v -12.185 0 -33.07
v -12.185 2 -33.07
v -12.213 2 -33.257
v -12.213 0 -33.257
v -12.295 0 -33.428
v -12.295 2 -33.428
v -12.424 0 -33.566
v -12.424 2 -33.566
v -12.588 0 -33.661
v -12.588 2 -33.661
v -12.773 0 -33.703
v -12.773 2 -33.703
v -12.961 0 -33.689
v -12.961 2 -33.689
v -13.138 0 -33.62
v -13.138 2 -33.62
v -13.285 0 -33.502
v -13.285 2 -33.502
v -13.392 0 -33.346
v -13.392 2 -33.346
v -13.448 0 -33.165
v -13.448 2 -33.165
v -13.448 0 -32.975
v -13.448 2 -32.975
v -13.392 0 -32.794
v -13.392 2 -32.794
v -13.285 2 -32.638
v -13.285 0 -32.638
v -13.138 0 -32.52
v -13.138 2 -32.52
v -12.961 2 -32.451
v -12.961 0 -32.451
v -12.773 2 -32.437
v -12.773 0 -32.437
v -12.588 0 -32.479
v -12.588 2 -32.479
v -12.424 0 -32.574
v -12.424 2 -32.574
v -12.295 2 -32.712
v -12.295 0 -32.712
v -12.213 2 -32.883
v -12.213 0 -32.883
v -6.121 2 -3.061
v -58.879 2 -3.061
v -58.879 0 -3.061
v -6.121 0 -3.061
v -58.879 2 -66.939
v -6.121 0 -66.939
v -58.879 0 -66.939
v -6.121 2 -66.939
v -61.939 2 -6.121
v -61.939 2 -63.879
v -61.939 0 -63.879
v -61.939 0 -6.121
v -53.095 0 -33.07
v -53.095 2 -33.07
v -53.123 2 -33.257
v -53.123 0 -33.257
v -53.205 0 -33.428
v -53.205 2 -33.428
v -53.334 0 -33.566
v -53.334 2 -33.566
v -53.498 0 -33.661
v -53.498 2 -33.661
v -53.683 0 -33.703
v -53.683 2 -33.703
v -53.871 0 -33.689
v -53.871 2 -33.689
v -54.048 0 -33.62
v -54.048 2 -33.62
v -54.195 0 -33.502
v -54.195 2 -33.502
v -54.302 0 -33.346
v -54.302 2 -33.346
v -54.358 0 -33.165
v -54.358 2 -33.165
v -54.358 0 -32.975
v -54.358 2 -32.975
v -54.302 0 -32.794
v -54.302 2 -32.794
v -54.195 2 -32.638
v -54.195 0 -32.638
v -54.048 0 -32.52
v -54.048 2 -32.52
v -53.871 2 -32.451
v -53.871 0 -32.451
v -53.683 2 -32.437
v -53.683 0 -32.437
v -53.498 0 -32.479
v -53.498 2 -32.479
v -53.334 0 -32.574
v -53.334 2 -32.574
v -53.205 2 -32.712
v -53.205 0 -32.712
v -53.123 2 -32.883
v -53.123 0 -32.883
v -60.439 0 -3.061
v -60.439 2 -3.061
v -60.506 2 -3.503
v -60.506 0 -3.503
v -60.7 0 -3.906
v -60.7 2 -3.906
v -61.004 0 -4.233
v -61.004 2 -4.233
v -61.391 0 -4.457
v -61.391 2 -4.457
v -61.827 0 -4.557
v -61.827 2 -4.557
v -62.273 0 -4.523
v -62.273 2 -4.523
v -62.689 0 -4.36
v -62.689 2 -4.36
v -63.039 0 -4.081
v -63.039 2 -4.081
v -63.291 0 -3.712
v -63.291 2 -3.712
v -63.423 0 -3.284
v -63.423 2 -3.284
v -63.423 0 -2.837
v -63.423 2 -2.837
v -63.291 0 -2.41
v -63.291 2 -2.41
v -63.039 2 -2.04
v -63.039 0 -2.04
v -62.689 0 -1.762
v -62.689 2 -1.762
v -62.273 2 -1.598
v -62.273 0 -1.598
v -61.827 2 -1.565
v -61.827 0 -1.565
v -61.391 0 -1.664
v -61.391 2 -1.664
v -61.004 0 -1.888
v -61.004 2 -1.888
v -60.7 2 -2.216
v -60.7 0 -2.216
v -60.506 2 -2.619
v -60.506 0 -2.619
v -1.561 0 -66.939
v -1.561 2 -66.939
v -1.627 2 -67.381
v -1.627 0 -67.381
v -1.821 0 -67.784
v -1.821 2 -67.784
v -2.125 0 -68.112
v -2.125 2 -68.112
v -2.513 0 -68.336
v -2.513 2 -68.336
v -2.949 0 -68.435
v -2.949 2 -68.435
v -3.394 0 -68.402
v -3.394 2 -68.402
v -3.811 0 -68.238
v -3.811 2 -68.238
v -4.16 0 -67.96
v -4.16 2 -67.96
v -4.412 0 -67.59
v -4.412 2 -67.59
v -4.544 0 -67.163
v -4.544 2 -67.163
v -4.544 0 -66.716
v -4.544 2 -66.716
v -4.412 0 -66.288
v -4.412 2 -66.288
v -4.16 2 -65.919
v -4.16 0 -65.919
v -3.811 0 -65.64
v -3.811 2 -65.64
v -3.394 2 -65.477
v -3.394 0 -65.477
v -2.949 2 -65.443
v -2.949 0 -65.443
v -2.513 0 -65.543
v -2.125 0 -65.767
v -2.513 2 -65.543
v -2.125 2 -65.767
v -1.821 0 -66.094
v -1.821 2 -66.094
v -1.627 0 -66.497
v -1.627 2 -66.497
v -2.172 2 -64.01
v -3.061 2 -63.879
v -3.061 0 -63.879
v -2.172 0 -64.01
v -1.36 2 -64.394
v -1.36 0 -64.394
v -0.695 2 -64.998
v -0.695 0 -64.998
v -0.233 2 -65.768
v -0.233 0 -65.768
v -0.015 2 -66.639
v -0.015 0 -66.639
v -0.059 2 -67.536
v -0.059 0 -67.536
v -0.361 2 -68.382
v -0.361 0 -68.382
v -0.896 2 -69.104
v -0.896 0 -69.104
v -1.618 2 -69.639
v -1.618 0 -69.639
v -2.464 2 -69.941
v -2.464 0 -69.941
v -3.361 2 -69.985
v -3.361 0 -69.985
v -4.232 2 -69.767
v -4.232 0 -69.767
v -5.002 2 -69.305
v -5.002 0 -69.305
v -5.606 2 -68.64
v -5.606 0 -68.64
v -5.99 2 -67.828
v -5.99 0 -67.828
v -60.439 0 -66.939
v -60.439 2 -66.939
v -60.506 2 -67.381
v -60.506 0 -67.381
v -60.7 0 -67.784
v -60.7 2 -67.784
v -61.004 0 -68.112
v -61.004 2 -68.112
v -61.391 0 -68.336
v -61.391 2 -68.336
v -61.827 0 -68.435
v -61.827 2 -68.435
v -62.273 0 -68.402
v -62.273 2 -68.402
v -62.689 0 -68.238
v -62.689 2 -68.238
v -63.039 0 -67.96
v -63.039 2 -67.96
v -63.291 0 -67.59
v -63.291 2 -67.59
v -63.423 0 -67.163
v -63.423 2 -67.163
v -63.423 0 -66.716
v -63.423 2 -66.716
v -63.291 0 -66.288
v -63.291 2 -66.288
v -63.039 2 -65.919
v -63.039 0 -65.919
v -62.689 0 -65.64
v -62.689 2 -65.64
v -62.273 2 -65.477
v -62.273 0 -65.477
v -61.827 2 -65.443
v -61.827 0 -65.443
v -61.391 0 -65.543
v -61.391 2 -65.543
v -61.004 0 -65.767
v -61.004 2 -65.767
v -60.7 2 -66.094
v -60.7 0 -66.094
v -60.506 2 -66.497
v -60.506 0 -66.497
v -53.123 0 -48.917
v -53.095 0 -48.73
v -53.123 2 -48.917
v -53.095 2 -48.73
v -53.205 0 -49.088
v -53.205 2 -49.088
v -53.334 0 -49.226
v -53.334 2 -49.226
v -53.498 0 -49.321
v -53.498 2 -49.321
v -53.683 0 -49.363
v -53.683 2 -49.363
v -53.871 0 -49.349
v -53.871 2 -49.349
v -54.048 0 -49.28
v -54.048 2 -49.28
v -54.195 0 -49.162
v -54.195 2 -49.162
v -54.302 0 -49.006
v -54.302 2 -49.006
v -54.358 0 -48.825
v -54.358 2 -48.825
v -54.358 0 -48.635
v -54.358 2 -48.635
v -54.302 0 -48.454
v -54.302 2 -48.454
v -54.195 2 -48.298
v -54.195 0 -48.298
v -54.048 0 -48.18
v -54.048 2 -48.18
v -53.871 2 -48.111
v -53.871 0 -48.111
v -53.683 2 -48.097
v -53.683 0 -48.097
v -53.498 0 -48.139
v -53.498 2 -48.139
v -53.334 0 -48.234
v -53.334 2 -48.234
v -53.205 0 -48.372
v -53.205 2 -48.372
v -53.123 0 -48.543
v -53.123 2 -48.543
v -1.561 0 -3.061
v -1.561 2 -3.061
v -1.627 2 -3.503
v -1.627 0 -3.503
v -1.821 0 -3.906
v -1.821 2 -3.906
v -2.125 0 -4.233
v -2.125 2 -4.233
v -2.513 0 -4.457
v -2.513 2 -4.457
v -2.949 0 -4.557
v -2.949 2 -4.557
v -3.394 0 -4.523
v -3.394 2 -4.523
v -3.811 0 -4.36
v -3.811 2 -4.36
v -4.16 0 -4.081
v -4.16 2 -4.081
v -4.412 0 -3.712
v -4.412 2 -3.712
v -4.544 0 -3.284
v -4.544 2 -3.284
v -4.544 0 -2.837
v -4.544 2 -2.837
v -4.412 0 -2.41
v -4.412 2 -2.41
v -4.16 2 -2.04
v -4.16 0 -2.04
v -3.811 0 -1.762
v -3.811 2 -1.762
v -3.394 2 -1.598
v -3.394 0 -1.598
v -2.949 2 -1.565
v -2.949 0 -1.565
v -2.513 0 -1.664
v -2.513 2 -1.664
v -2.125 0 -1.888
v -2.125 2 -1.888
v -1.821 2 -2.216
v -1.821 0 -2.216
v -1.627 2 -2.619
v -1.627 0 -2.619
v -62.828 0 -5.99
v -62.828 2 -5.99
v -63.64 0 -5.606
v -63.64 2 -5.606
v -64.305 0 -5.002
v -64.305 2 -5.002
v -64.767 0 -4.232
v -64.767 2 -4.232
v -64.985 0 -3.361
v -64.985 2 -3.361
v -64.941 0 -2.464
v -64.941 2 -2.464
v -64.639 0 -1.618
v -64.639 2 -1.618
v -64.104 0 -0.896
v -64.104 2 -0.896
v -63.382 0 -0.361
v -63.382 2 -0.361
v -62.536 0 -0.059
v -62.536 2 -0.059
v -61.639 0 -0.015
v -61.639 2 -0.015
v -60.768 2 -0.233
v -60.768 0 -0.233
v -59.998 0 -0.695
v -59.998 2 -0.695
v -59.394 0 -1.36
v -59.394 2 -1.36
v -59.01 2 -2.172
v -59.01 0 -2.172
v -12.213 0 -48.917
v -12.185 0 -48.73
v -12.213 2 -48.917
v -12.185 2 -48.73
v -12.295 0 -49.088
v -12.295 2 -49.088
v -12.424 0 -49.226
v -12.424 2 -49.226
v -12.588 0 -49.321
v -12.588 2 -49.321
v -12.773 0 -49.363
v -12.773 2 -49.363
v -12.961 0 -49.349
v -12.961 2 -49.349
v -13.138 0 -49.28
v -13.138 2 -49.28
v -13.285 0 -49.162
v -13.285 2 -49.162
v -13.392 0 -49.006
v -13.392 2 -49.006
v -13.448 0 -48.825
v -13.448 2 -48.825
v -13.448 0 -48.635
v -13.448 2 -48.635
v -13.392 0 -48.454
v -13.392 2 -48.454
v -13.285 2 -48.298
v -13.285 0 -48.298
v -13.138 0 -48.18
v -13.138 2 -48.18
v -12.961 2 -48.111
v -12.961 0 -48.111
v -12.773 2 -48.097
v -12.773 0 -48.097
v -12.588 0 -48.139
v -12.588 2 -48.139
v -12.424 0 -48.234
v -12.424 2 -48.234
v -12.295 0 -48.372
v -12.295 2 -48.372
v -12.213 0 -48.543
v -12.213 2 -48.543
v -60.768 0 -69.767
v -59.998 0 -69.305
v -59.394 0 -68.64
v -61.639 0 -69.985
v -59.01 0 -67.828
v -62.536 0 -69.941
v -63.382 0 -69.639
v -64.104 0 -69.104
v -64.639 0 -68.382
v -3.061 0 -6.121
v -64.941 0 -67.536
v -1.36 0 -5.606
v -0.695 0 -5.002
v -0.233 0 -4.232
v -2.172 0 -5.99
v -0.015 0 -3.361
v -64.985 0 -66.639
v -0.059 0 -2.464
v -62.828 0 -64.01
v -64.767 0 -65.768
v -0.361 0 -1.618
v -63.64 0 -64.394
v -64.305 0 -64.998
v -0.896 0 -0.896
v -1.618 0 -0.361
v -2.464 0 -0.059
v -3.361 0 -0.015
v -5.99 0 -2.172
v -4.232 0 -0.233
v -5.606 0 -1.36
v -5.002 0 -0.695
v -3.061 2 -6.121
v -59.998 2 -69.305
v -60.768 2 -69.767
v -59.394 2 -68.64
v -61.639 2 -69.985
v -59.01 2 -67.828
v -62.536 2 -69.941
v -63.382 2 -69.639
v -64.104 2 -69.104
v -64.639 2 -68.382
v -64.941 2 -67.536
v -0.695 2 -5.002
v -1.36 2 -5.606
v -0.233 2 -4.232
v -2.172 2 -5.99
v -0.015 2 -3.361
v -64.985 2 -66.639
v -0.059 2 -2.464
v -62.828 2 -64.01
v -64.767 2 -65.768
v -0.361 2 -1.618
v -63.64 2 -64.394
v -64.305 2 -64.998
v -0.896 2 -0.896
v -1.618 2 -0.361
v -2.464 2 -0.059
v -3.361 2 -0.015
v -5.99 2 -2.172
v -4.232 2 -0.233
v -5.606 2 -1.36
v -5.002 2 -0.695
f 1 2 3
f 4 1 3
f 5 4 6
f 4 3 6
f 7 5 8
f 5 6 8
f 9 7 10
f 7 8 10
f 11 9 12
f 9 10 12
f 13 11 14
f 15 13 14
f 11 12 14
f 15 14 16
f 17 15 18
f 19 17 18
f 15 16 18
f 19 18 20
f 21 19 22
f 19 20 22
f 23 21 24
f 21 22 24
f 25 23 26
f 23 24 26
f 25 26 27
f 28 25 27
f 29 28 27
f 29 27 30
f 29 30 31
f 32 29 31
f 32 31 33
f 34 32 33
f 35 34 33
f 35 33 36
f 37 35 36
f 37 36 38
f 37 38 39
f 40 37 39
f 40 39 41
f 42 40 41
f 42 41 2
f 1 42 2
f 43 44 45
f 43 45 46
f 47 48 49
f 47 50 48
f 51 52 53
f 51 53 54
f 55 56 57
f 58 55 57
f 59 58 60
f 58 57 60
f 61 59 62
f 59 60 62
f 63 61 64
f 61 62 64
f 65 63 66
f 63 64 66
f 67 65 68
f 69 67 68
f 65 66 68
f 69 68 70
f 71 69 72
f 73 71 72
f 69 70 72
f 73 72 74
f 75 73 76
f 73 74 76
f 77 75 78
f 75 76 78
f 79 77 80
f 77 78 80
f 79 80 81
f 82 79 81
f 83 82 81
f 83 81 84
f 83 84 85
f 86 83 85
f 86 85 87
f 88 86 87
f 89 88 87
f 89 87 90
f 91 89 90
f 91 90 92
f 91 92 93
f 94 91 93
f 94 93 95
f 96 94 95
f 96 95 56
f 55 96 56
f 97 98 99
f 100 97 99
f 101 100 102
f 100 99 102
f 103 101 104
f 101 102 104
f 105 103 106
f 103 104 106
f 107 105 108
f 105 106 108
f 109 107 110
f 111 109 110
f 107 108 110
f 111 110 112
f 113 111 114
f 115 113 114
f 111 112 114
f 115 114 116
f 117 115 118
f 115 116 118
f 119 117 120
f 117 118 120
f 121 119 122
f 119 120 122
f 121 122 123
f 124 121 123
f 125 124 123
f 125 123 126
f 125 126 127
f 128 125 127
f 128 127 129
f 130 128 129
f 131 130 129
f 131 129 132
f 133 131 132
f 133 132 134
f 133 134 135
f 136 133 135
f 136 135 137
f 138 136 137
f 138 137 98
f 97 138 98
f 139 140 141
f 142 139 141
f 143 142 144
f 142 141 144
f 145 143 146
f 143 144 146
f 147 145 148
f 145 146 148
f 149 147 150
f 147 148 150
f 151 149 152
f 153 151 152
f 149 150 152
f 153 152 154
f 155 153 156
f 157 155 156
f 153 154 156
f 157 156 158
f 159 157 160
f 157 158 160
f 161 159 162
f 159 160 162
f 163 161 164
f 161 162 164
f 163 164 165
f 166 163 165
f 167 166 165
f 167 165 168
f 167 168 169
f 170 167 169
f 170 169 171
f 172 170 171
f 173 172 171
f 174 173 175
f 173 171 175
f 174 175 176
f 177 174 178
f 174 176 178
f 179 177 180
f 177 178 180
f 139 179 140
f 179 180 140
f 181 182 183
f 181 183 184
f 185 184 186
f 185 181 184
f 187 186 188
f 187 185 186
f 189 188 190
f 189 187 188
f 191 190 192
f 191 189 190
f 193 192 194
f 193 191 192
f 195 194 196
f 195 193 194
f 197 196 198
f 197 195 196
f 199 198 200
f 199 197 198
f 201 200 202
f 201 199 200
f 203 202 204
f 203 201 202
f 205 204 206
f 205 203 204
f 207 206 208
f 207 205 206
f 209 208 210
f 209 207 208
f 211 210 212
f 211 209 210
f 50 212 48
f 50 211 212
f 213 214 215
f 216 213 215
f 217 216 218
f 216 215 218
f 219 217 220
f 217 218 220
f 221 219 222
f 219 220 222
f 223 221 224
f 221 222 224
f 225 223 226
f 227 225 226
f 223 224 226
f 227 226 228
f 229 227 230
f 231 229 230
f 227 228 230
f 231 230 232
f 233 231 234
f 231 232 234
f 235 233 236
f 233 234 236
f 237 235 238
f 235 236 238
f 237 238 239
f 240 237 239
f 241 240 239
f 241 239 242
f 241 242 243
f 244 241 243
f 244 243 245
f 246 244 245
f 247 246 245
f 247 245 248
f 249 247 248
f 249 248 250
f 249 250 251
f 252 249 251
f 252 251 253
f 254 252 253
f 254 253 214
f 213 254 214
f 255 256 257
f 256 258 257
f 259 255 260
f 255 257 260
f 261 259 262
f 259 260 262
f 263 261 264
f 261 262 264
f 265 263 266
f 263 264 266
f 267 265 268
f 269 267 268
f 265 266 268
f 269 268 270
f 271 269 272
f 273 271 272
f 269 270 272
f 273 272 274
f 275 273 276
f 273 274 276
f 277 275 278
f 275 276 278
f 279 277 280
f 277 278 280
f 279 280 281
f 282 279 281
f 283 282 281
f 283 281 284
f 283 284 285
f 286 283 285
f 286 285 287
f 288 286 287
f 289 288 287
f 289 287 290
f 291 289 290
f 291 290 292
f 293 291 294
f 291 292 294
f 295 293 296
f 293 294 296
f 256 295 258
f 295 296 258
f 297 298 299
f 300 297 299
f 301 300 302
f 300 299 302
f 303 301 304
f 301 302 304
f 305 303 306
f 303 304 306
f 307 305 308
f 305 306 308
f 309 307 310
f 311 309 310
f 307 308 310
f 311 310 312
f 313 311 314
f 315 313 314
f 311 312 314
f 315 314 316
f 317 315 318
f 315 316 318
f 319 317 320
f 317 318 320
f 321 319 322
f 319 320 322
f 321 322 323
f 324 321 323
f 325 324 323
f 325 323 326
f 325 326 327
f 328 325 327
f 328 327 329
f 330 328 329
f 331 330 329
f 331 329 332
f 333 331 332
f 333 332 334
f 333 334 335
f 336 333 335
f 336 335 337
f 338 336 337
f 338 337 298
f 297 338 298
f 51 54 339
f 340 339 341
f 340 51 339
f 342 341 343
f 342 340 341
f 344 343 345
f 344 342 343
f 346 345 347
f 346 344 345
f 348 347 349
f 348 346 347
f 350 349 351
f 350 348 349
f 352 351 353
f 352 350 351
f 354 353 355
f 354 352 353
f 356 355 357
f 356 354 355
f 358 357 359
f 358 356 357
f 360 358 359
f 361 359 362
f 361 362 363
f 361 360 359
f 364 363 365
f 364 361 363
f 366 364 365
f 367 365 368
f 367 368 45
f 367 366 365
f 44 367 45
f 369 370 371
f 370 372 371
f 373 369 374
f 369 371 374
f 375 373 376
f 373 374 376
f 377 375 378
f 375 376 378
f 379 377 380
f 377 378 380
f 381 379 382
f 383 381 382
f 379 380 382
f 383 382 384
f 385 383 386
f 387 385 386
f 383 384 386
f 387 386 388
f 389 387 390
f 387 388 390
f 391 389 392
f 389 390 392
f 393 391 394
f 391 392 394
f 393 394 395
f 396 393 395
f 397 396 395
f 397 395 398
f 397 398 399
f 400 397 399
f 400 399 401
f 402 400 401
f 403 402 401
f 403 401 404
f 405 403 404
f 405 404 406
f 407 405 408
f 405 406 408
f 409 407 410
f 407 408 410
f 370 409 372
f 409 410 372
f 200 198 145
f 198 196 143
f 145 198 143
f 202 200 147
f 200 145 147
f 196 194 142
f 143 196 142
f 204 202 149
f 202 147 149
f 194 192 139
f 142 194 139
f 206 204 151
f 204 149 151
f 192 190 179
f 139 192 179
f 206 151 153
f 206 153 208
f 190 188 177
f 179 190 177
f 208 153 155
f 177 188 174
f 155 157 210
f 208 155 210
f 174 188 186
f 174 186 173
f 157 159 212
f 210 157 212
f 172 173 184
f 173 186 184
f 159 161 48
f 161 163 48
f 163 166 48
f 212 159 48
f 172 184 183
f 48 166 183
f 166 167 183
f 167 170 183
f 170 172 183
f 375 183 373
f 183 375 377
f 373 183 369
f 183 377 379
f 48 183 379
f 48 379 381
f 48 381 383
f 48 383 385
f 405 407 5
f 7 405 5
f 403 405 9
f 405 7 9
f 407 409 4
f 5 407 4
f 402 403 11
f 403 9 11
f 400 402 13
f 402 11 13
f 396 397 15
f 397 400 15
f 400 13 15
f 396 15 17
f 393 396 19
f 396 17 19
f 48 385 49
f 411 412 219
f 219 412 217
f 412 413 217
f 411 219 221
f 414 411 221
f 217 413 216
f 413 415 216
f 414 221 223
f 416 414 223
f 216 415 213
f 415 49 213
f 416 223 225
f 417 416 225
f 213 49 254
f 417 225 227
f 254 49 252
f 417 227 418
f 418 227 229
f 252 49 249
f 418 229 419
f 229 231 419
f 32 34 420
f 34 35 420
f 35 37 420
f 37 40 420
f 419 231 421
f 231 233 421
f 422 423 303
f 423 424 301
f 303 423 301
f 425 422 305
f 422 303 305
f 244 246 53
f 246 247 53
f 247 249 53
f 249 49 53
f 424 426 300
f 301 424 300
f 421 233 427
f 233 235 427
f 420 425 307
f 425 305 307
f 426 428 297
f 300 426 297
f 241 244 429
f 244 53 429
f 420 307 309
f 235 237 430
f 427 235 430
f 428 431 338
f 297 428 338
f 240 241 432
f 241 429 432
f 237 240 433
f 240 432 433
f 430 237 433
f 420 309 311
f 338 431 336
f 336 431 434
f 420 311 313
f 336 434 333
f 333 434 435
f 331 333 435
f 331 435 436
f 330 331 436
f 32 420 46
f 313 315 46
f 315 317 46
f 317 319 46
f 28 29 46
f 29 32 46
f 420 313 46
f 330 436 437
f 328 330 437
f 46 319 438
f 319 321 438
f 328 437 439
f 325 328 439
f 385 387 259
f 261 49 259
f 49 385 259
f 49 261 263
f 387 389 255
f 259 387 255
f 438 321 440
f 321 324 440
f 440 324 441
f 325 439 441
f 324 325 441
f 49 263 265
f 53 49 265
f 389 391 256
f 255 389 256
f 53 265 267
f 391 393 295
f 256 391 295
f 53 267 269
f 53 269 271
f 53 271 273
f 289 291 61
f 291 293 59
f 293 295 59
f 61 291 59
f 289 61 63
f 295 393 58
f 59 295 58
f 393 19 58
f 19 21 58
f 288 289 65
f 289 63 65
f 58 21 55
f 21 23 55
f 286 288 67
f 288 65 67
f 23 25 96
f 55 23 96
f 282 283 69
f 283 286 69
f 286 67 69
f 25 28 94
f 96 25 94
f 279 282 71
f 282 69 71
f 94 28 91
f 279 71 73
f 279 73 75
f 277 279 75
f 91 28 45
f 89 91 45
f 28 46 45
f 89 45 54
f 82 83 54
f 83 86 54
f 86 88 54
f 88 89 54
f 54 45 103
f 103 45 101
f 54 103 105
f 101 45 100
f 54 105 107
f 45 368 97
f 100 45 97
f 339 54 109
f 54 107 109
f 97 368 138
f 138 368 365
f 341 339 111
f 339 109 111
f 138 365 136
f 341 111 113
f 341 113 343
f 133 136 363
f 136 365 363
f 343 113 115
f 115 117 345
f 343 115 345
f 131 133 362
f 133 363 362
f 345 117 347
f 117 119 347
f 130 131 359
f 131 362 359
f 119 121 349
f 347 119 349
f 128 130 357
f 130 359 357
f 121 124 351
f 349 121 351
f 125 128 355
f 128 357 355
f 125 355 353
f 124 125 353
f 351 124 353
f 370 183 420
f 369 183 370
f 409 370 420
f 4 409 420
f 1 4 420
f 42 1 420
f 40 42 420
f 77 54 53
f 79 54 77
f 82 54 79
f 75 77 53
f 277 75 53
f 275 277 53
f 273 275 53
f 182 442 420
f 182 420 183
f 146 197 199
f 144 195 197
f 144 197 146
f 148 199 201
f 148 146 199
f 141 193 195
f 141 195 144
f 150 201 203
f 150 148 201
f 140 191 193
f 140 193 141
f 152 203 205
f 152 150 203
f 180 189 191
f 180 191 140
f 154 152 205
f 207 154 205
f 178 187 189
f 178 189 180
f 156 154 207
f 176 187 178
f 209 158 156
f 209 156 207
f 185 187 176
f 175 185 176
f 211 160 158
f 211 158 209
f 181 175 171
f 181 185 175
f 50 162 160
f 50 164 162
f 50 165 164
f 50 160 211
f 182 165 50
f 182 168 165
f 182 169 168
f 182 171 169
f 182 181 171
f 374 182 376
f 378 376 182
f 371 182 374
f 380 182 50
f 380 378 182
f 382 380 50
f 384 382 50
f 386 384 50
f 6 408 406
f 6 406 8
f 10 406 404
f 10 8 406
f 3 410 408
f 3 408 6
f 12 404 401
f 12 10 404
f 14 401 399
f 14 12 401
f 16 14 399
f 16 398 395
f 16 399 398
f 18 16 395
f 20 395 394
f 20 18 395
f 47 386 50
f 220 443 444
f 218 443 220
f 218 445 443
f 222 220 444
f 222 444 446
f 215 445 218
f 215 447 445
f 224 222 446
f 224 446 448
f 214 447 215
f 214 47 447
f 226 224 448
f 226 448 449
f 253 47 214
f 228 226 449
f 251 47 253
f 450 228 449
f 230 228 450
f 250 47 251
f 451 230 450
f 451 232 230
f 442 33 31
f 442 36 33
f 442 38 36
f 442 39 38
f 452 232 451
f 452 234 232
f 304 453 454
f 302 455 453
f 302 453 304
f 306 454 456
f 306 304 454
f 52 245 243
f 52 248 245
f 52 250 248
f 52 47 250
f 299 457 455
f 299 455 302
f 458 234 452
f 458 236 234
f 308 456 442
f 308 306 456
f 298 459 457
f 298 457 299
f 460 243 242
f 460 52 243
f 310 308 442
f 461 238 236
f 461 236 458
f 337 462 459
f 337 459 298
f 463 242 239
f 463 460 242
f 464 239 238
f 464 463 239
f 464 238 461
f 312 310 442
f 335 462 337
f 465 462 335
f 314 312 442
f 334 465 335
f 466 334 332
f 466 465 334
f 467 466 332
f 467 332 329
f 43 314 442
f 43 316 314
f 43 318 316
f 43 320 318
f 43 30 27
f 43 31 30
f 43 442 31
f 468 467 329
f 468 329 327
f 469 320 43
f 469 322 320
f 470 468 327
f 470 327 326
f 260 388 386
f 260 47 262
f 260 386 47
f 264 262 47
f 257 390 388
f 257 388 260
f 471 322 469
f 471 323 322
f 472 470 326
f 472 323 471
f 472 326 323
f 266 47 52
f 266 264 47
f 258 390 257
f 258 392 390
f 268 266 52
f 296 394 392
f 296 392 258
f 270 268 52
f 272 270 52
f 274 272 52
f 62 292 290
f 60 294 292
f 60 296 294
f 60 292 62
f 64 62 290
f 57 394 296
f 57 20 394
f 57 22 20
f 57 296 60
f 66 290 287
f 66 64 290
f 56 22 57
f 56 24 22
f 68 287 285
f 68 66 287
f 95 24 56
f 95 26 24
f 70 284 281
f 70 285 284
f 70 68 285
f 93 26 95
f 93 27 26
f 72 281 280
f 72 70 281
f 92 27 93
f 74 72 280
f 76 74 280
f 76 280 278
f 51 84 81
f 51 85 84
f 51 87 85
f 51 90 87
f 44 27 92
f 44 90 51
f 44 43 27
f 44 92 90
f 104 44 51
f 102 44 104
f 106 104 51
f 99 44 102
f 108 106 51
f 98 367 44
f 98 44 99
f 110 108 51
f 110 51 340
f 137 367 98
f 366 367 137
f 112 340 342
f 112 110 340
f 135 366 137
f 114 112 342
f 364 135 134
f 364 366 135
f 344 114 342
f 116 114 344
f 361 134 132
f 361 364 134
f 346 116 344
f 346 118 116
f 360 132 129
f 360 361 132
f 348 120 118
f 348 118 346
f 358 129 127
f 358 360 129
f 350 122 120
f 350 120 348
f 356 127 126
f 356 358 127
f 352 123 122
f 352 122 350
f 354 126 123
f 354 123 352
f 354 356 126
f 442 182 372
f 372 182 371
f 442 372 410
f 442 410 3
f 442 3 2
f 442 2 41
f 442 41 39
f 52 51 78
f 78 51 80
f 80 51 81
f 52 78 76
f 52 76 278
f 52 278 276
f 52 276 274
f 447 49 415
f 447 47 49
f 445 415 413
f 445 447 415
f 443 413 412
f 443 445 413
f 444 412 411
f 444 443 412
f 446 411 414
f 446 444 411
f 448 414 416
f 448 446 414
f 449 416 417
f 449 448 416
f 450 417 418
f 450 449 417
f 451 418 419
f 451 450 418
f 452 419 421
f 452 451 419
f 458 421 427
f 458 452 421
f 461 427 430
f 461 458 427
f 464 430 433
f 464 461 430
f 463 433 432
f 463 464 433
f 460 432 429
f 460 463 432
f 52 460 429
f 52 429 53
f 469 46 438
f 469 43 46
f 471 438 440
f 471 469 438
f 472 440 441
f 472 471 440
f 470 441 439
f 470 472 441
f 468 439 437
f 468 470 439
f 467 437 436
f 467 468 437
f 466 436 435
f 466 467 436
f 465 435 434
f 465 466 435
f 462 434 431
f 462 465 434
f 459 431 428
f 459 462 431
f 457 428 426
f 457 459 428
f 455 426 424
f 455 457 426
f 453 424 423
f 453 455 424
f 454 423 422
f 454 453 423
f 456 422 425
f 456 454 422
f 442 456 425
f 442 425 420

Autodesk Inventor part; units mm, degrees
ref_plane "YZ Plane" through (0, 0, 0) normal (1, 0, 0) x (0, 1, 0)
ref_plane "XZ Plane" through (0, 0, 0) normal (0, 1, 0) x (-1, 0, 0)
ref_plane "XY Plane" through (0, 0, 0) normal (0, 0, 1) x (1, 0, 0)
sketch "Sketch1" plane through (0, 0, 0) normal (0, 1, 0) x (-1, 0, 0)
  line L0 (0, 0) -> (65, 0)
  line L1 (65, 0) -> (65, -70)
  line L2 (65, -70) -> (0, -70)
  line L3 (0, -70) -> (0, 0)
  dimension "d0" = 65
  dimension "d1" = 70
extrude "Extrusion1" add sketch "Sketch1" along normal blind 2
sketch "Sketch2" plane through (0, 2, 0) normal (0, 1, 0) x (1, 0, 0)
  line L0 (0, 70) -> (-65, 70) projected
  line L1 (-32.5, 69) -> (-10.5, 69)
  line L2 (-32.5, 69) -> (-54.5, 69)
  line L3 (-10.5, 69) -> (-10.5, 55)
  line L4 (-10.5, 55) -> (-54.5, 55)
  line L5 (-54.5, 55) -> (-54.5, 69)
  line L6 (-65, 0) -> (0, 0) projected
  line L7 (-32.4987, 3) -> (-20.9987, 3)
  line L8 (-32.4987, 3) -> (-43.9987, 3)
  line L9 (-11.55, 31.8) -> (-55, 31.8)
  line L10 (-11.55, 31.8) -> (-11.55, 50)
  line L11 (-55, 31.8) -> (-55, 50)
  line L12 (-55, 50) -> (-11.55, 50)
  line L13 (-20.9987, 3) -> (-20.9987, 19)
  line L14 (-20.9987, 19) -> (-43.9987, 19)
  line L15 (-43.9987, 19) -> (-43.9987, 3)
  line L16 (-20.9987, 19) -> (-20.9987, 16.39)
  line L17 (-20.9987, 19) -> (-20.9987, 16.08)
  line L18 (-55, 50) -> (-53.73, 50)
  circle A0 centre (-53.73, 48.73) radius 0.635
  circle A1 centre (-53.73, 33.07) radius 0.635
  circle A2 centre (-12.82, 48.73) radius 0.635
  circle A3 centre (-12.82, 33.07) radius 0.635
  point P0 (-2, 70)
  point P1 (-63, 70)
  point P2 (-63, 0)
  point P3 (-2, 0)
  dimension "d20" = 18.2
  dimension "d27" = 23
  dimension "d54" = 1.27
  dimension "d56" = 1.27
  dimension "d58" = 1.27
  dimension "d60" = 43.45
  dimension "d63" = 1.27
  dimension "d64" = 1.27
extrude "Extrusion2" cut sketch "Sketch2" against normal blind 2 contours A0 | A1 | A2 | A3
sketch "Sketch4" plane through (0, 2, 0) normal (0, 1, 0) x (1, 0, 0)
  arc A0 (-63, 70) -> (-65, 68) centre (-63, 68) ccw projected
  line L0 (-63, 68) -> (-61.5, 68) construction
  circle A1 centre (-61.9393, 66.9393) radius 1.5
  arc A2 (0, 68) -> (-2, 70) centre (-2, 68) ccw projected
  arc A3 (-65, 2) -> (-63, 0) centre (-63, 2) ccw projected
  arc A4 (-2, 0) -> (0, 2) centre (-2, 2) ccw projected
  line L1 (-2, 68) -> (-0.5, 68) construction
  circle A5 centre (-3.0607, 66.9393) radius 1.5
  line L2 (-63, 2) -> (-61.5, 2) construction
  circle A6 centre (-61.9393, 3.0607) radius 1.5
  arc A7 (-2, 0) -> (0, 2) centre (-2, 2) ccw projected
  line L3 (-2, 2) -> (-0.5, 2) construction
  circle A8 centre (-3.0607, 3.0607) radius 1.5
  point P0 (0, 0)
  dimension "d69" = 3
  dimension "d72" = 3
  dimension "d75" = 3
  dimension "d78" = 3
extrude "Extrusion3" cut sketch "Sketch4" against normal blind 2
sketch "Sketch5" plane through (0, 2, 0) normal (0, 1, 0) x (1, 0, 0)
  circle A0 centre (-3.0607, 3.0607) radius 1.5 projected
  circle A1 centre (-3.0607, 66.9393) radius 1.5 projected
  circle A2 centre (-61.9393, 3.0607) radius 1.5 projected
  circle A3 centre (-61.9393, 66.9393) radius 1.5 projected
  circle A4 centre (-12.82, 48.73) radius 0.635 projected
  circle A5 centre (-53.73, 33.07) radius 0.635 projected
  circle A6 centre (-12.82, 33.07) radius 0.635 projected
  circle A7 centre (-53.73, 48.73) radius 0.635 projected
  line L0 (-65, 70) -> (-65, 0) projected
  line L1 (-65, 0) -> (0, 0) projected
  line L2 (0, 0) -> (0, 70) projected
  line L3 (0, 70) -> (-65, 70) projected
  circle A8 centre (-61.9393, 3.0607) radius 1.5 projected
  circle A9 centre (-3.0607, 66.9393) radius 1.5 projected
  line L4 (-61.9393, 3.0607) -> (-3.0607, 3.0607)
  line L5 (-3.0607, 3.0607) -> (-3.0607, 66.9393)
  line L6 (-3.0607, 66.9393) -> (-61.9393, 66.9393)
  line L7 (-61.9393, 66.9393) -> (-61.9393, 3.0607)
  circle A10 centre (-61.9393, 3.0607) radius 3.0607
  line L8 (-65, 0) -> (0, 0) projected
  circle A11 centre (-61.9393, 66.9393) radius 1.5 projected
  circle A12 centre (-61.9393, 66.9393) radius 3.0607
  line L9 (0, 70) -> (-65, 70) projected
  circle A13 centre (-3.0607, 66.9393) radius 1.5 projected
  circle A14 centre (-3.0607, 66.9393) radius 3.0607
  circle A15 centre (-3.0607, 3.0607) radius 1.5 projected
  circle A16 centre (-3.0607, 3.0607) radius 3.0607
  line L10 (0, 0) -> (0, 70) projected
  line L11 (0, 3.0607) -> (0, 0)
  line L12 (0, 0) -> (-3.0607, 0)
  line L13 (0, 66.9393) -> (0, 70)
  line L14 (0, 70) -> (-3.0607, 70)
  line L15 (-65, 70) -> (-65, 0) projected
  line L16 (-61.9393, 70) -> (-65, 70)
  line L17 (-65, 70) -> (-65, 66.9393)
  line L18 (-65, 3.0607) -> (-65, 0)
  line L19 (-65, 0) -> (-61.9393, 0)
  point P0 (-3.0607, 0)
extrude "Extrusion4" cut sketch "Sketch5" against normal blind 2 contours L2 L1 A16 | A14 L3 L2 | L1 L0 A10 | A12 L0 L3
sketch "Sketch6" plane through (0, 2, 0) normal (0, 1, 0) x (1, 0, 0)
  arc A0 (0, 66.9393) -> (-3.0607, 70) centre (-3.0607, 66.9393) ccw projected
  line L0 (-3.0607, 70) -> (-61.9393, 70) projected
  arc A1 (-61.9393, 70) -> (-65, 66.9393) centre (-61.9393, 66.9393) ccw projected
  line L1 (-65, 66.9393) -> (-65, 3.0607) projected
  arc A2 (-65, 3.0607) -> (-61.9393, 0) centre (-61.9393, 3.0607) ccw projected
  line L2 (-61.9393, 0) -> (-3.0607, 0) projected
  arc A3 (-3.0607, 0) -> (0, 3.0607) centre (-3.0607, 3.0607) ccw projected
  line L3 (0, 3.0607) -> (0, 66.9393) projected
  circle A4 centre (-3.0607, 3.0607) radius 1.5 projected
  circle A5 centre (-3.0607, 66.9393) radius 1.5 projected
  circle A6 centre (-61.9393, 3.0607) radius 1.5 projected
  circle A7 centre (-61.9393, 66.9393) radius 1.5 projected
  circle A8 centre (-12.82, 48.73) radius 0.635 projected
  circle A9 centre (-53.73, 33.07) radius 0.635 projected
  circle A10 centre (-12.82, 33.07) radius 0.635 projected
  circle A11 centre (-53.73, 48.73) radius 0.635 projected
  circle A12 centre (-3.0607, 66.9393) radius 3.0607
  circle A13 centre (-3.0607, 3.0607) radius 1.5 projected
  circle A14 centre (-3.0607, 3.0607) radius 3.0607
  circle A15 centre (-61.9393, 3.0607) radius 1.5 projected
  circle A16 centre (-61.9393, 3.0607) radius 3.0607
  circle A17 centre (-61.9393, 66.9393) radius 1.5 projected
  circle A18 centre (-61.9393, 66.9393) radius 3.0607
  line L4 (-58.8787, 3.0607) -> (-6.1213, 3.0607)
  line L5 (-3.0607, 6.1213) -> (-3.0607, 63.8787)
  line L6 (-6.1213, 66.9393) -> (-58.8787, 66.9393)
  line L7 (-61.9393, 63.8787) -> (-61.9393, 6.1213)
  arc A19 (-65, 3.0607) -> (-61.9393, 0) centre (-61.9393, 3.0607) ccw projected
  line L8 (-61.9393, 0) -> (-3.0607, 0)
  line L9 (-61.9393, 0) -> (-3.0607, 0) projected
  line L10 (-65, 3.0607) -> (-65, 66.9393)
  line L11 (-3.0607, 70) -> (-61.9393, 70) projected
  line L12 (-61.9393, 70) -> (-3.0607, 70)
  arc A20 (0, 66.9393) -> (-3.0607, 70) centre (-3.0607, 66.9393) ccw projected
  line L13 (0, 3.0607) -> (0, 66.9393) projected
  line L14 (0, 3.0607) -> (0, 66.9393)
  point P0 (0, 0)
  point P1 (-65, 3.0607)
  point P2 (-3.0607, 0)
extrude "Extrusion5" cut sketch "Sketch6" against normal blind 2 contours L3 A14 L5 A12 | A12 L6 A18 L0 | L2 A16 L4 A14 | A18 L7 A16 L1
properties part number "base" material "Steel, Mild, Welded"
